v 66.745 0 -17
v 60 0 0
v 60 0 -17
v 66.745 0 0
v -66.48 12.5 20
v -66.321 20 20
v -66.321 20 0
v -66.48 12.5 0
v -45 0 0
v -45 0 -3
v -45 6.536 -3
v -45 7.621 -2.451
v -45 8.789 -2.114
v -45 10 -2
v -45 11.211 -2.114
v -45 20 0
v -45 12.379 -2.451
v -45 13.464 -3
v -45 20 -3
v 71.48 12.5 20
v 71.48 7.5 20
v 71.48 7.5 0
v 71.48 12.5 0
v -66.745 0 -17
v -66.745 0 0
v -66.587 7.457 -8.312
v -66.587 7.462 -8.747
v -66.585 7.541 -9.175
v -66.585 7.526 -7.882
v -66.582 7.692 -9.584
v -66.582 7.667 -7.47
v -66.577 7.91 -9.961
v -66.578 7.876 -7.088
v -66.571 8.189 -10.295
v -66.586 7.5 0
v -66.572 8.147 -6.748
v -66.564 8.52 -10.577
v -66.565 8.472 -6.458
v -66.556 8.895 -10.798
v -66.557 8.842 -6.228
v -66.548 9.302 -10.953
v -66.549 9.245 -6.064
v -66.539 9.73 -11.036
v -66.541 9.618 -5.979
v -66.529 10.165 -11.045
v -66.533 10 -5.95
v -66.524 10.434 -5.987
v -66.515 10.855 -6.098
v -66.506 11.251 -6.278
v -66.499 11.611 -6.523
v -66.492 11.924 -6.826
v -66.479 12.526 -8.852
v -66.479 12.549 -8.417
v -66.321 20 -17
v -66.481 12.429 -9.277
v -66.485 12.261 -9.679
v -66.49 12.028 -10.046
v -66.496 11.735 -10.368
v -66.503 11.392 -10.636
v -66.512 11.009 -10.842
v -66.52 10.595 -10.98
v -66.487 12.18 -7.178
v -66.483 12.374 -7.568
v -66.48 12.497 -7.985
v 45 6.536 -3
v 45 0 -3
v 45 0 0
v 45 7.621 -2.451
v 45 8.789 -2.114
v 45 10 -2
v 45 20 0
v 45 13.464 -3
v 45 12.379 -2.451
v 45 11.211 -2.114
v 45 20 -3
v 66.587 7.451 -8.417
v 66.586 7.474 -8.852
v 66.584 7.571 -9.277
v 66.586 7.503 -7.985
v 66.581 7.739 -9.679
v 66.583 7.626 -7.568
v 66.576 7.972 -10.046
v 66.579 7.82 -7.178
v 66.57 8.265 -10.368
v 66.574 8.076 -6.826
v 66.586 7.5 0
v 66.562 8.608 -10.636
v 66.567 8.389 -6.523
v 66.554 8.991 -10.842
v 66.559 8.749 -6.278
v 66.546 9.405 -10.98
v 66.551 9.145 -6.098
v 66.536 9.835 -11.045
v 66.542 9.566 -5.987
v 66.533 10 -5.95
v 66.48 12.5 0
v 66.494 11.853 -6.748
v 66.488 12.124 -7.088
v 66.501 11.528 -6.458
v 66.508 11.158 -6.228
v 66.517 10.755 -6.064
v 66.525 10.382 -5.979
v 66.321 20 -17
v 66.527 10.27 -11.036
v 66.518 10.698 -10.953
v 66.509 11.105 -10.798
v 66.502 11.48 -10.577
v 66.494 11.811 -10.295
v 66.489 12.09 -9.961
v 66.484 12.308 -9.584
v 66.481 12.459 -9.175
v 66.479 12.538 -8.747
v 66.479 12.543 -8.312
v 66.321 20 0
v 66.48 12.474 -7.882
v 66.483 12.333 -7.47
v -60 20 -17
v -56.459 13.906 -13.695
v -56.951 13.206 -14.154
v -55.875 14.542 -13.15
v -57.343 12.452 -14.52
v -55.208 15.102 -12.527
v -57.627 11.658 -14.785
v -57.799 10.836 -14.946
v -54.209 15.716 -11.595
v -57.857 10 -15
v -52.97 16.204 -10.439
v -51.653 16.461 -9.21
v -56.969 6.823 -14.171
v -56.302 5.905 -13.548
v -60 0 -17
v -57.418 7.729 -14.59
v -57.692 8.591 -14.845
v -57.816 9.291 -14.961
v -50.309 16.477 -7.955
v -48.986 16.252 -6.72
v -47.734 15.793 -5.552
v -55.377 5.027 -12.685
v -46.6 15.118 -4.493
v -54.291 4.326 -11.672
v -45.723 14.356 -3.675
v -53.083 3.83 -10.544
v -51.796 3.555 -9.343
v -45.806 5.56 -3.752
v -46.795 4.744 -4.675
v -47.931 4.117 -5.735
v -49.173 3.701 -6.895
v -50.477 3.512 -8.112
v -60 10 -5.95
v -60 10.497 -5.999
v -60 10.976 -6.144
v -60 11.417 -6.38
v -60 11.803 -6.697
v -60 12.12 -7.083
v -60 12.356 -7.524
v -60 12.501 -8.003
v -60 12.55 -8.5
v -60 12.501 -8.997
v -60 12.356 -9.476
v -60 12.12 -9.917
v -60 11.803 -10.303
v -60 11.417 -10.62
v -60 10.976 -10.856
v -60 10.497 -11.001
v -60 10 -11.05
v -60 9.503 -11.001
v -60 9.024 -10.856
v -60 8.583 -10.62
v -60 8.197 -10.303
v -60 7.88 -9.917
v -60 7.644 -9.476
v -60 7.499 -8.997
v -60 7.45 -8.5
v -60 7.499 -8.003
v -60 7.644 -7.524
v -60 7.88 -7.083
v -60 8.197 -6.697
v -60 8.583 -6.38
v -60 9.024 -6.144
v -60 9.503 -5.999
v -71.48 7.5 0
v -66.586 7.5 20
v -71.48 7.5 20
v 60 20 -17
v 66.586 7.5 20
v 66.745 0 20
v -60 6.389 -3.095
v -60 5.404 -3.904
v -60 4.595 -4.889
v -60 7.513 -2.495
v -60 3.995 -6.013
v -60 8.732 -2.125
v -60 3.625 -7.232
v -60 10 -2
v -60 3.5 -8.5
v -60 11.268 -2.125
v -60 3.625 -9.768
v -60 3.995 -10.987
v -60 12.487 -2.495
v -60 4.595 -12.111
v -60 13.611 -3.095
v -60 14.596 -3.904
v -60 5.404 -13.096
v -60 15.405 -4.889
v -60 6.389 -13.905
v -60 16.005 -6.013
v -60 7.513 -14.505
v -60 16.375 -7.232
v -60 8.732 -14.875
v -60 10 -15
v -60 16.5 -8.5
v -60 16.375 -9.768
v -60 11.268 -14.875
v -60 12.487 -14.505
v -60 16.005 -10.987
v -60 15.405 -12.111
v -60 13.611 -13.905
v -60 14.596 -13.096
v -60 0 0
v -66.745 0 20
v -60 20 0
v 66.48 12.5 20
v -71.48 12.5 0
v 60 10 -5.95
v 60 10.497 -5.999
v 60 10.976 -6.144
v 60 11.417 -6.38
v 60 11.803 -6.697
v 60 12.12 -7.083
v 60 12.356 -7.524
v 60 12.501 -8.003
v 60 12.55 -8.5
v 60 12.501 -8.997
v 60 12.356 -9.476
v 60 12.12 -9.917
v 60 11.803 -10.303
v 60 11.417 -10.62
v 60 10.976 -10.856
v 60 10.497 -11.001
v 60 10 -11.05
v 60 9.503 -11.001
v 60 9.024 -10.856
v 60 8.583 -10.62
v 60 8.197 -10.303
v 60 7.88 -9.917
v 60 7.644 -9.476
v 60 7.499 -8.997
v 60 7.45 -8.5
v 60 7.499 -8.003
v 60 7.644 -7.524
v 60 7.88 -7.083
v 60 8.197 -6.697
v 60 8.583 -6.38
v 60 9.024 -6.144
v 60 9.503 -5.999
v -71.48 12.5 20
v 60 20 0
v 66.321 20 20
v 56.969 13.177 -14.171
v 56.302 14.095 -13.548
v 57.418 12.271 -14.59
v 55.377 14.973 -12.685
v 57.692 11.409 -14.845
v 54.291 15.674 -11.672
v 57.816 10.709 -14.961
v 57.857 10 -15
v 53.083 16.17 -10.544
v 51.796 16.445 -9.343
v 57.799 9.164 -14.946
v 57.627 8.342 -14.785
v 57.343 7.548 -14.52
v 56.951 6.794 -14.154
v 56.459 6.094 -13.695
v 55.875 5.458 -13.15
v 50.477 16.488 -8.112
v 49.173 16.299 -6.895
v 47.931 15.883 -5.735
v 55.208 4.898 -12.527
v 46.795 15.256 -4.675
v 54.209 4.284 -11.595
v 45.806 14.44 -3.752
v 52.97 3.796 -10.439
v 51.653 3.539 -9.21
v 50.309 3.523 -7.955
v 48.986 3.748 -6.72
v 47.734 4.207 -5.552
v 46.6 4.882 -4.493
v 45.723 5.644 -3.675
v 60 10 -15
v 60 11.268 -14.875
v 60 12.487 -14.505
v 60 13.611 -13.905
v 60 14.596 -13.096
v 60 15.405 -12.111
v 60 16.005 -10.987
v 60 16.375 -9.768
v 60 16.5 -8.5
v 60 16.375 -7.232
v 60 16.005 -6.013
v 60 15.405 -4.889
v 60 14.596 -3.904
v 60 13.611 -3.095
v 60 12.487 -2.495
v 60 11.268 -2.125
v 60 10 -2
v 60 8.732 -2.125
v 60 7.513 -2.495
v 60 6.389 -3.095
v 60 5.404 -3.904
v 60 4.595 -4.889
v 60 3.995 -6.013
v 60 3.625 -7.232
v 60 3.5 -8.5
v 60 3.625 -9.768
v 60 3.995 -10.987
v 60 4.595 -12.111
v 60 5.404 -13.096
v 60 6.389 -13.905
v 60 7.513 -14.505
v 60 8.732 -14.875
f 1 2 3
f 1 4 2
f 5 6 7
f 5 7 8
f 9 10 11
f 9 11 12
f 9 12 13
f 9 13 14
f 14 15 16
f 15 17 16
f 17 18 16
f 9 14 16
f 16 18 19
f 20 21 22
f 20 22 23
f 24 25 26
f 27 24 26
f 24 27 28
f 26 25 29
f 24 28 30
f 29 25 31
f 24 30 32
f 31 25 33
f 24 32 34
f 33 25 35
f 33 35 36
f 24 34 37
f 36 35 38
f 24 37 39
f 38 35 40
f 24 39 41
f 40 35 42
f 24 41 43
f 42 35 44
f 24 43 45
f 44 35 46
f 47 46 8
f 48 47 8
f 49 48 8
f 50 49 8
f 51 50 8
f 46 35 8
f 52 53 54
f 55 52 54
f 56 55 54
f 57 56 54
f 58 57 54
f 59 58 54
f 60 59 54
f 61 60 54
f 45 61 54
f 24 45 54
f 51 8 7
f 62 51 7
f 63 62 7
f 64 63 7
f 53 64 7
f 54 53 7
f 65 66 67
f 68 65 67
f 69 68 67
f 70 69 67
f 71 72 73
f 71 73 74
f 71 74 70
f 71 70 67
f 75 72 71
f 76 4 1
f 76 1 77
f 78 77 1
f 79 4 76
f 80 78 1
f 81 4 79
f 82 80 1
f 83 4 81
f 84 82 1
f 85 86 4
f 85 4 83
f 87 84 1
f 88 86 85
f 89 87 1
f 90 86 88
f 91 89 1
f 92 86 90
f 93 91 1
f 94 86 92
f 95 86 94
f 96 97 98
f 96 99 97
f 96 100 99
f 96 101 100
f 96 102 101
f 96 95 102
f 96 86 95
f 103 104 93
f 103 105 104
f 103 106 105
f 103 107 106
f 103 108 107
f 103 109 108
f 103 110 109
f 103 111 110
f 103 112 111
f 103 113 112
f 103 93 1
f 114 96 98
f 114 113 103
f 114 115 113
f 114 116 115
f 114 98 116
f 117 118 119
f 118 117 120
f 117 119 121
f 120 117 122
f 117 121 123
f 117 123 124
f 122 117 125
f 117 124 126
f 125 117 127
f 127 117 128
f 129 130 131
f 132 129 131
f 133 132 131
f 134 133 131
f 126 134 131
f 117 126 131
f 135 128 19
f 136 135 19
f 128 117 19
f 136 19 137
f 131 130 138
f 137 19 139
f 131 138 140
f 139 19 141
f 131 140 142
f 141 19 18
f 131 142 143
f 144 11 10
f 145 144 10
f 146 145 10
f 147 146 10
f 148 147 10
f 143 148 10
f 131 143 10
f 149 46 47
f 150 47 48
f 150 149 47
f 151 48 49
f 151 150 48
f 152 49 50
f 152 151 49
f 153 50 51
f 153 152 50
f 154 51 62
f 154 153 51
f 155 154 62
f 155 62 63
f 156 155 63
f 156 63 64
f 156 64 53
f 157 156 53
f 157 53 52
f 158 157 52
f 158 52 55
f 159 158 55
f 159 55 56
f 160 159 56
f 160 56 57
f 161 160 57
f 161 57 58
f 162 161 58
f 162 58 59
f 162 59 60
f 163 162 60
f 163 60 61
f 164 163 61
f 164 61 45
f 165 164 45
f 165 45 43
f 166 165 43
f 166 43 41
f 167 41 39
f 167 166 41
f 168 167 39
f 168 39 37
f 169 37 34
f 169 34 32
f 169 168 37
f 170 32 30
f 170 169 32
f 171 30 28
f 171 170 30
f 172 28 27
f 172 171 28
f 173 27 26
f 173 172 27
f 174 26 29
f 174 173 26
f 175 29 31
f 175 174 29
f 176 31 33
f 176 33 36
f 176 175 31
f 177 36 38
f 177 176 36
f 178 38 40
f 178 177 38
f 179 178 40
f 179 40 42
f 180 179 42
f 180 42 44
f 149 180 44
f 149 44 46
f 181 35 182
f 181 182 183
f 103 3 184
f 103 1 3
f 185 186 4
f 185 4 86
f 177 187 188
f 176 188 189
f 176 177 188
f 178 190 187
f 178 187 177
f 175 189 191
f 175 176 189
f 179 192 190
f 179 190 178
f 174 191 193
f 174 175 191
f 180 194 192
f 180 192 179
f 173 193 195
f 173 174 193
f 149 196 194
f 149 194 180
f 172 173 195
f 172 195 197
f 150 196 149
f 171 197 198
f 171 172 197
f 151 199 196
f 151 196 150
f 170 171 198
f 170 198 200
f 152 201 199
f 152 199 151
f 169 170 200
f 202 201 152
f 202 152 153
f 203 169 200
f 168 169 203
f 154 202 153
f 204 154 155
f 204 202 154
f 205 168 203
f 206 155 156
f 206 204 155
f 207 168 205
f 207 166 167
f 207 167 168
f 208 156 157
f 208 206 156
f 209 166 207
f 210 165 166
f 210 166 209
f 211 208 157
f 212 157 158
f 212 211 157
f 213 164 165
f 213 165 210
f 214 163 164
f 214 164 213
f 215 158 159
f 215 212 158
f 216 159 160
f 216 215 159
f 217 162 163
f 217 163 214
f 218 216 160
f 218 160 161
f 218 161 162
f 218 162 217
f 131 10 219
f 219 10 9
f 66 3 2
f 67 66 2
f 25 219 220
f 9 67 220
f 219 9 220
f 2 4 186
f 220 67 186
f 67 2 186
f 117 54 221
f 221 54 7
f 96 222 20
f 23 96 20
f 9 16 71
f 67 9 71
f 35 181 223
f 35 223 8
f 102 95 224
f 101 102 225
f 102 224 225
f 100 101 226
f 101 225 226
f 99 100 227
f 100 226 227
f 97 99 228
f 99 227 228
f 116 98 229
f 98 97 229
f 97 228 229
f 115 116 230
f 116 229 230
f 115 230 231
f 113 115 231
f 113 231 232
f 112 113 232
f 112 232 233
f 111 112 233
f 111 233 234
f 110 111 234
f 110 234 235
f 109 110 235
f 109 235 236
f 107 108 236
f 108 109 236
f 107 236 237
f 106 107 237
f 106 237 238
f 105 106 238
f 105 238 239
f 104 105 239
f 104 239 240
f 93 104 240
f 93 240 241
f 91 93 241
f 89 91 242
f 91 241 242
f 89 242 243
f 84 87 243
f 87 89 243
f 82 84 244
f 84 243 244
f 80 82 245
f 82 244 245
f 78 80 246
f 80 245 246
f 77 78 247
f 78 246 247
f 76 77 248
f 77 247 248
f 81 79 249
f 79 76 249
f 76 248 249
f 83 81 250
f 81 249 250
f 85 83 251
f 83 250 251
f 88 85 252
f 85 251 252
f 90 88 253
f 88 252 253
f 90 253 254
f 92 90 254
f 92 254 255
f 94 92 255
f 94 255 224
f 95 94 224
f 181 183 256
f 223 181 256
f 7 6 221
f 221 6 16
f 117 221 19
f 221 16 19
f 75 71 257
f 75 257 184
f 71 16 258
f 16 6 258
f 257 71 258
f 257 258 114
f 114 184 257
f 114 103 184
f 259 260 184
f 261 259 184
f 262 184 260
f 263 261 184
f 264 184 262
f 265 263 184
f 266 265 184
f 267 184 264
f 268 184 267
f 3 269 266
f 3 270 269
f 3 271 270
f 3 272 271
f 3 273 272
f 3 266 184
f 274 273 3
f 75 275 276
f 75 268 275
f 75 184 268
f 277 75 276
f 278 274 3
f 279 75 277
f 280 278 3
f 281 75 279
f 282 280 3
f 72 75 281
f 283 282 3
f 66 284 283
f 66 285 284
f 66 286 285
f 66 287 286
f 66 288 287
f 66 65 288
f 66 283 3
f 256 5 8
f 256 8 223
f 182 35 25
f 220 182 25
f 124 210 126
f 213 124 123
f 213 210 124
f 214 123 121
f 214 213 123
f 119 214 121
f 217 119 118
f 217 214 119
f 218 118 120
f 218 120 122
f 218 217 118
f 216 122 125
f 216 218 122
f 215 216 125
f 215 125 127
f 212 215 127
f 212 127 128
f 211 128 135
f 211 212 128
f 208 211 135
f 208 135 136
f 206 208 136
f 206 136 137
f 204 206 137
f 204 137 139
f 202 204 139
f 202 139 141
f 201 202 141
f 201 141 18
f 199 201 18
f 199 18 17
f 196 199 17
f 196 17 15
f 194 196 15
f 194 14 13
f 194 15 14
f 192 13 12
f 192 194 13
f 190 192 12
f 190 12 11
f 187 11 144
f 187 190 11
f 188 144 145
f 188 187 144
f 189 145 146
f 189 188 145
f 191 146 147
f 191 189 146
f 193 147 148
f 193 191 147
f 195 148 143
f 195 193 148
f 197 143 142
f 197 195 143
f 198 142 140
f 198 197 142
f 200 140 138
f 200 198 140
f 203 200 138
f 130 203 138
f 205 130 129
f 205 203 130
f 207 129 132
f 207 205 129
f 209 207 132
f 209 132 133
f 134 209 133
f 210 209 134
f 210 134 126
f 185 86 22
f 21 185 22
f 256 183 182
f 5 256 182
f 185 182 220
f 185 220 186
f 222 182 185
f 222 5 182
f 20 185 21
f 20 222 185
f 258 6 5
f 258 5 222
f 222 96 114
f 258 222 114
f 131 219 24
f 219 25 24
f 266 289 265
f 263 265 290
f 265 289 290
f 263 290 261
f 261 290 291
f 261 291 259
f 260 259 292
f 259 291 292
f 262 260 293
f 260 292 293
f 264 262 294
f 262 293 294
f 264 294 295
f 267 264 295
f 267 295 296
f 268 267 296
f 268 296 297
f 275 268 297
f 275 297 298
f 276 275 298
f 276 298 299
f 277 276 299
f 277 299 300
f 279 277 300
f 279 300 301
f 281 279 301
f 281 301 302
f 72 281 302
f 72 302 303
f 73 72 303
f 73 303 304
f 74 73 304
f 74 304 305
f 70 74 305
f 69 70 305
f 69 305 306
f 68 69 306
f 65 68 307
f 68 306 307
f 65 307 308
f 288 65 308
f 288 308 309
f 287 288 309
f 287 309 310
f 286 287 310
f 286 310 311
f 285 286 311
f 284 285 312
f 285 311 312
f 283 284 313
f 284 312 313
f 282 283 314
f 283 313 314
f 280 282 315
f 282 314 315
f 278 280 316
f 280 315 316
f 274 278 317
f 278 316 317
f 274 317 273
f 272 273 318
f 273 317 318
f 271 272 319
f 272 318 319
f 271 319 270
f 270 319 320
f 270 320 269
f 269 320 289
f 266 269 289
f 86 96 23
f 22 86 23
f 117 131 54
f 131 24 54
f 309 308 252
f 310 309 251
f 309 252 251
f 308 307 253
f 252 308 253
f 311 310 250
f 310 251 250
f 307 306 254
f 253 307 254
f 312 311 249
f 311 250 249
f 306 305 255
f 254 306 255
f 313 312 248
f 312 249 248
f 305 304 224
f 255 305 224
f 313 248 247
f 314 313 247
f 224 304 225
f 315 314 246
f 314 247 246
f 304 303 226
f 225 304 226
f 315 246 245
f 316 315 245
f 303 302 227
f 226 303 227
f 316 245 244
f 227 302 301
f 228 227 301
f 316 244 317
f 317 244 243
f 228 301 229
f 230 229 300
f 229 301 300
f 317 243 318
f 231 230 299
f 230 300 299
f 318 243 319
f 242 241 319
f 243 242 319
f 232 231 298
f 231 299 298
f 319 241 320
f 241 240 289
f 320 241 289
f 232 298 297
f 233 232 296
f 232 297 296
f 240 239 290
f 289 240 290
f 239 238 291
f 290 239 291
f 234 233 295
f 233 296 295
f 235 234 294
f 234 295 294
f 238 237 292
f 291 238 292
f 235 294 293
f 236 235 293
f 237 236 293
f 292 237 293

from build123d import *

# Parameters (mm, degrees)
BOSS_EXTRUDE1_DEPTH = 20
SKETCH3_W           = 17
SKETCH3_H           = 20
SKETCH2_W           = 17
SKETCH2_H           = 20.004497681
SKETCH5_W           = 5
SKETCH5_H           = 5
BOSS_EXTRUDE2_DEPTH = 20
SKETCH6_R           = 2.55
CUT_EXTRUDE1_DEPTH  = 12.47988838
SKETCH8_W           = 17
SKETCH8_H           = 20
SKETCH7_W           = 3
SKETCH7_H           = 20
SKETCH9_R           = 6.5
CUT_EXTRUDE2_DEPTH  = 30


with BuildPart() as part:
    # Sketch1 → Boss-Extrude1 (new body)
    with BuildSketch(Plane.XY):
        Polygon((-66.745, 0), (66.745, 0), (66.320821408, 20), (-66.320821408, 20), align=None)
    extrude(amount=BOSS_EXTRUDE1_DEPTH)

    # Sketch3 → Loft1 section 0
    with BuildSketch(Plane(origin=(60, 0, 0), x_dir=(0, 0, -1), z_dir=(1, 0, 0))):
        with Locations((8.5, 10)):
            Rectangle(SKETCH3_W, SKETCH3_H)
    # Sketch2 → Loft1 section 1
    with BuildSketch(Plane(origin=(66.71499035, 1.414953534, 0), x_dir=(0, 0, -1), z_dir=(0.999775167, 0.021204161, 0))):
        with Locations((8.5, 8.586977106)):
            Rectangle(SKETCH2_W, SKETCH2_H)
    loft1 = loft()

    # Sketch5 → Boss-Extrude2 (add)
    with BuildSketch(Plane.XY.offset(20)):
        with Locations((68.97988838, 10)):
            Rectangle(SKETCH5_W, SKETCH5_H)
    boss_extrude2 = extrude(amount=-BOSS_EXTRUDE2_DEPTH)

    # Mirror2: Boss-Extrude2 across plane
    add(boss_extrude2.mirror(Plane(origin=(0, 0, 0), x_dir=(0, 0, 1), z_dir=(1, 0, 0))))

    # Sketch6 → Cut-Extrude1 (cut, through all)
    with BuildSketch(Plane.ZY.offset(-60)):
        with Locations((-8.5, 10)):
            Circle(SKETCH6_R)
    cut_extrude1 = extrude(amount=-CUT_EXTRUDE1_DEPTH, mode=Mode.SUBTRACT)

    # Sketch8 → Loft2 section 0
    with BuildSketch(Plane.ZY.offset(-60)):
        with Locations((-8.5, 10)):
            Rectangle(SKETCH8_W, SKETCH8_H)
    # Sketch7 → Loft2 section 1
    with BuildSketch(Plane(origin=(45, 0, 0), x_dir=(0, 0, -1), z_dir=(1, 0, 0))):
        with Locations((1.5, 10)):
            Rectangle(SKETCH7_W, SKETCH7_H)
    loft2 = loft()

    # Sketch9 → Cut-Extrude2 (cut)
    with BuildSketch(Plane(origin=(60, 0, 0), x_dir=(0, 0, -1), z_dir=(1, 0, 0))):
        with Locations((8.5, 10)):
            Circle(SKETCH9_R)
    cut_extrude2 = extrude(amount=-CUT_EXTRUDE2_DEPTH, mode=Mode.SUBTRACT)

    # Mirror3: Loft1, Cut-Extrude1, Loft2, Cut-Extrude2 across plane
    add(loft1.mirror(Plane(origin=(0, 0, 0), x_dir=(0, 0, 1), z_dir=(1, 0, 0))))
    add(cut_extrude1.mirror(Plane(origin=(0, 0, 0), x_dir=(0, 0, 1), z_dir=(1, 0, 0))), mode=Mode.SUBTRACT)
    add(loft2.mirror(Plane(origin=(0, 0, 0), x_dir=(0, 0, 1), z_dir=(1, 0, 0))))
    add(cut_extrude2.mirror(Plane(origin=(0, 0, 0), x_dir=(0, 0, 1), z_dir=(1, 0, 0))), mode=Mode.SUBTRACT)


solid = part.part
